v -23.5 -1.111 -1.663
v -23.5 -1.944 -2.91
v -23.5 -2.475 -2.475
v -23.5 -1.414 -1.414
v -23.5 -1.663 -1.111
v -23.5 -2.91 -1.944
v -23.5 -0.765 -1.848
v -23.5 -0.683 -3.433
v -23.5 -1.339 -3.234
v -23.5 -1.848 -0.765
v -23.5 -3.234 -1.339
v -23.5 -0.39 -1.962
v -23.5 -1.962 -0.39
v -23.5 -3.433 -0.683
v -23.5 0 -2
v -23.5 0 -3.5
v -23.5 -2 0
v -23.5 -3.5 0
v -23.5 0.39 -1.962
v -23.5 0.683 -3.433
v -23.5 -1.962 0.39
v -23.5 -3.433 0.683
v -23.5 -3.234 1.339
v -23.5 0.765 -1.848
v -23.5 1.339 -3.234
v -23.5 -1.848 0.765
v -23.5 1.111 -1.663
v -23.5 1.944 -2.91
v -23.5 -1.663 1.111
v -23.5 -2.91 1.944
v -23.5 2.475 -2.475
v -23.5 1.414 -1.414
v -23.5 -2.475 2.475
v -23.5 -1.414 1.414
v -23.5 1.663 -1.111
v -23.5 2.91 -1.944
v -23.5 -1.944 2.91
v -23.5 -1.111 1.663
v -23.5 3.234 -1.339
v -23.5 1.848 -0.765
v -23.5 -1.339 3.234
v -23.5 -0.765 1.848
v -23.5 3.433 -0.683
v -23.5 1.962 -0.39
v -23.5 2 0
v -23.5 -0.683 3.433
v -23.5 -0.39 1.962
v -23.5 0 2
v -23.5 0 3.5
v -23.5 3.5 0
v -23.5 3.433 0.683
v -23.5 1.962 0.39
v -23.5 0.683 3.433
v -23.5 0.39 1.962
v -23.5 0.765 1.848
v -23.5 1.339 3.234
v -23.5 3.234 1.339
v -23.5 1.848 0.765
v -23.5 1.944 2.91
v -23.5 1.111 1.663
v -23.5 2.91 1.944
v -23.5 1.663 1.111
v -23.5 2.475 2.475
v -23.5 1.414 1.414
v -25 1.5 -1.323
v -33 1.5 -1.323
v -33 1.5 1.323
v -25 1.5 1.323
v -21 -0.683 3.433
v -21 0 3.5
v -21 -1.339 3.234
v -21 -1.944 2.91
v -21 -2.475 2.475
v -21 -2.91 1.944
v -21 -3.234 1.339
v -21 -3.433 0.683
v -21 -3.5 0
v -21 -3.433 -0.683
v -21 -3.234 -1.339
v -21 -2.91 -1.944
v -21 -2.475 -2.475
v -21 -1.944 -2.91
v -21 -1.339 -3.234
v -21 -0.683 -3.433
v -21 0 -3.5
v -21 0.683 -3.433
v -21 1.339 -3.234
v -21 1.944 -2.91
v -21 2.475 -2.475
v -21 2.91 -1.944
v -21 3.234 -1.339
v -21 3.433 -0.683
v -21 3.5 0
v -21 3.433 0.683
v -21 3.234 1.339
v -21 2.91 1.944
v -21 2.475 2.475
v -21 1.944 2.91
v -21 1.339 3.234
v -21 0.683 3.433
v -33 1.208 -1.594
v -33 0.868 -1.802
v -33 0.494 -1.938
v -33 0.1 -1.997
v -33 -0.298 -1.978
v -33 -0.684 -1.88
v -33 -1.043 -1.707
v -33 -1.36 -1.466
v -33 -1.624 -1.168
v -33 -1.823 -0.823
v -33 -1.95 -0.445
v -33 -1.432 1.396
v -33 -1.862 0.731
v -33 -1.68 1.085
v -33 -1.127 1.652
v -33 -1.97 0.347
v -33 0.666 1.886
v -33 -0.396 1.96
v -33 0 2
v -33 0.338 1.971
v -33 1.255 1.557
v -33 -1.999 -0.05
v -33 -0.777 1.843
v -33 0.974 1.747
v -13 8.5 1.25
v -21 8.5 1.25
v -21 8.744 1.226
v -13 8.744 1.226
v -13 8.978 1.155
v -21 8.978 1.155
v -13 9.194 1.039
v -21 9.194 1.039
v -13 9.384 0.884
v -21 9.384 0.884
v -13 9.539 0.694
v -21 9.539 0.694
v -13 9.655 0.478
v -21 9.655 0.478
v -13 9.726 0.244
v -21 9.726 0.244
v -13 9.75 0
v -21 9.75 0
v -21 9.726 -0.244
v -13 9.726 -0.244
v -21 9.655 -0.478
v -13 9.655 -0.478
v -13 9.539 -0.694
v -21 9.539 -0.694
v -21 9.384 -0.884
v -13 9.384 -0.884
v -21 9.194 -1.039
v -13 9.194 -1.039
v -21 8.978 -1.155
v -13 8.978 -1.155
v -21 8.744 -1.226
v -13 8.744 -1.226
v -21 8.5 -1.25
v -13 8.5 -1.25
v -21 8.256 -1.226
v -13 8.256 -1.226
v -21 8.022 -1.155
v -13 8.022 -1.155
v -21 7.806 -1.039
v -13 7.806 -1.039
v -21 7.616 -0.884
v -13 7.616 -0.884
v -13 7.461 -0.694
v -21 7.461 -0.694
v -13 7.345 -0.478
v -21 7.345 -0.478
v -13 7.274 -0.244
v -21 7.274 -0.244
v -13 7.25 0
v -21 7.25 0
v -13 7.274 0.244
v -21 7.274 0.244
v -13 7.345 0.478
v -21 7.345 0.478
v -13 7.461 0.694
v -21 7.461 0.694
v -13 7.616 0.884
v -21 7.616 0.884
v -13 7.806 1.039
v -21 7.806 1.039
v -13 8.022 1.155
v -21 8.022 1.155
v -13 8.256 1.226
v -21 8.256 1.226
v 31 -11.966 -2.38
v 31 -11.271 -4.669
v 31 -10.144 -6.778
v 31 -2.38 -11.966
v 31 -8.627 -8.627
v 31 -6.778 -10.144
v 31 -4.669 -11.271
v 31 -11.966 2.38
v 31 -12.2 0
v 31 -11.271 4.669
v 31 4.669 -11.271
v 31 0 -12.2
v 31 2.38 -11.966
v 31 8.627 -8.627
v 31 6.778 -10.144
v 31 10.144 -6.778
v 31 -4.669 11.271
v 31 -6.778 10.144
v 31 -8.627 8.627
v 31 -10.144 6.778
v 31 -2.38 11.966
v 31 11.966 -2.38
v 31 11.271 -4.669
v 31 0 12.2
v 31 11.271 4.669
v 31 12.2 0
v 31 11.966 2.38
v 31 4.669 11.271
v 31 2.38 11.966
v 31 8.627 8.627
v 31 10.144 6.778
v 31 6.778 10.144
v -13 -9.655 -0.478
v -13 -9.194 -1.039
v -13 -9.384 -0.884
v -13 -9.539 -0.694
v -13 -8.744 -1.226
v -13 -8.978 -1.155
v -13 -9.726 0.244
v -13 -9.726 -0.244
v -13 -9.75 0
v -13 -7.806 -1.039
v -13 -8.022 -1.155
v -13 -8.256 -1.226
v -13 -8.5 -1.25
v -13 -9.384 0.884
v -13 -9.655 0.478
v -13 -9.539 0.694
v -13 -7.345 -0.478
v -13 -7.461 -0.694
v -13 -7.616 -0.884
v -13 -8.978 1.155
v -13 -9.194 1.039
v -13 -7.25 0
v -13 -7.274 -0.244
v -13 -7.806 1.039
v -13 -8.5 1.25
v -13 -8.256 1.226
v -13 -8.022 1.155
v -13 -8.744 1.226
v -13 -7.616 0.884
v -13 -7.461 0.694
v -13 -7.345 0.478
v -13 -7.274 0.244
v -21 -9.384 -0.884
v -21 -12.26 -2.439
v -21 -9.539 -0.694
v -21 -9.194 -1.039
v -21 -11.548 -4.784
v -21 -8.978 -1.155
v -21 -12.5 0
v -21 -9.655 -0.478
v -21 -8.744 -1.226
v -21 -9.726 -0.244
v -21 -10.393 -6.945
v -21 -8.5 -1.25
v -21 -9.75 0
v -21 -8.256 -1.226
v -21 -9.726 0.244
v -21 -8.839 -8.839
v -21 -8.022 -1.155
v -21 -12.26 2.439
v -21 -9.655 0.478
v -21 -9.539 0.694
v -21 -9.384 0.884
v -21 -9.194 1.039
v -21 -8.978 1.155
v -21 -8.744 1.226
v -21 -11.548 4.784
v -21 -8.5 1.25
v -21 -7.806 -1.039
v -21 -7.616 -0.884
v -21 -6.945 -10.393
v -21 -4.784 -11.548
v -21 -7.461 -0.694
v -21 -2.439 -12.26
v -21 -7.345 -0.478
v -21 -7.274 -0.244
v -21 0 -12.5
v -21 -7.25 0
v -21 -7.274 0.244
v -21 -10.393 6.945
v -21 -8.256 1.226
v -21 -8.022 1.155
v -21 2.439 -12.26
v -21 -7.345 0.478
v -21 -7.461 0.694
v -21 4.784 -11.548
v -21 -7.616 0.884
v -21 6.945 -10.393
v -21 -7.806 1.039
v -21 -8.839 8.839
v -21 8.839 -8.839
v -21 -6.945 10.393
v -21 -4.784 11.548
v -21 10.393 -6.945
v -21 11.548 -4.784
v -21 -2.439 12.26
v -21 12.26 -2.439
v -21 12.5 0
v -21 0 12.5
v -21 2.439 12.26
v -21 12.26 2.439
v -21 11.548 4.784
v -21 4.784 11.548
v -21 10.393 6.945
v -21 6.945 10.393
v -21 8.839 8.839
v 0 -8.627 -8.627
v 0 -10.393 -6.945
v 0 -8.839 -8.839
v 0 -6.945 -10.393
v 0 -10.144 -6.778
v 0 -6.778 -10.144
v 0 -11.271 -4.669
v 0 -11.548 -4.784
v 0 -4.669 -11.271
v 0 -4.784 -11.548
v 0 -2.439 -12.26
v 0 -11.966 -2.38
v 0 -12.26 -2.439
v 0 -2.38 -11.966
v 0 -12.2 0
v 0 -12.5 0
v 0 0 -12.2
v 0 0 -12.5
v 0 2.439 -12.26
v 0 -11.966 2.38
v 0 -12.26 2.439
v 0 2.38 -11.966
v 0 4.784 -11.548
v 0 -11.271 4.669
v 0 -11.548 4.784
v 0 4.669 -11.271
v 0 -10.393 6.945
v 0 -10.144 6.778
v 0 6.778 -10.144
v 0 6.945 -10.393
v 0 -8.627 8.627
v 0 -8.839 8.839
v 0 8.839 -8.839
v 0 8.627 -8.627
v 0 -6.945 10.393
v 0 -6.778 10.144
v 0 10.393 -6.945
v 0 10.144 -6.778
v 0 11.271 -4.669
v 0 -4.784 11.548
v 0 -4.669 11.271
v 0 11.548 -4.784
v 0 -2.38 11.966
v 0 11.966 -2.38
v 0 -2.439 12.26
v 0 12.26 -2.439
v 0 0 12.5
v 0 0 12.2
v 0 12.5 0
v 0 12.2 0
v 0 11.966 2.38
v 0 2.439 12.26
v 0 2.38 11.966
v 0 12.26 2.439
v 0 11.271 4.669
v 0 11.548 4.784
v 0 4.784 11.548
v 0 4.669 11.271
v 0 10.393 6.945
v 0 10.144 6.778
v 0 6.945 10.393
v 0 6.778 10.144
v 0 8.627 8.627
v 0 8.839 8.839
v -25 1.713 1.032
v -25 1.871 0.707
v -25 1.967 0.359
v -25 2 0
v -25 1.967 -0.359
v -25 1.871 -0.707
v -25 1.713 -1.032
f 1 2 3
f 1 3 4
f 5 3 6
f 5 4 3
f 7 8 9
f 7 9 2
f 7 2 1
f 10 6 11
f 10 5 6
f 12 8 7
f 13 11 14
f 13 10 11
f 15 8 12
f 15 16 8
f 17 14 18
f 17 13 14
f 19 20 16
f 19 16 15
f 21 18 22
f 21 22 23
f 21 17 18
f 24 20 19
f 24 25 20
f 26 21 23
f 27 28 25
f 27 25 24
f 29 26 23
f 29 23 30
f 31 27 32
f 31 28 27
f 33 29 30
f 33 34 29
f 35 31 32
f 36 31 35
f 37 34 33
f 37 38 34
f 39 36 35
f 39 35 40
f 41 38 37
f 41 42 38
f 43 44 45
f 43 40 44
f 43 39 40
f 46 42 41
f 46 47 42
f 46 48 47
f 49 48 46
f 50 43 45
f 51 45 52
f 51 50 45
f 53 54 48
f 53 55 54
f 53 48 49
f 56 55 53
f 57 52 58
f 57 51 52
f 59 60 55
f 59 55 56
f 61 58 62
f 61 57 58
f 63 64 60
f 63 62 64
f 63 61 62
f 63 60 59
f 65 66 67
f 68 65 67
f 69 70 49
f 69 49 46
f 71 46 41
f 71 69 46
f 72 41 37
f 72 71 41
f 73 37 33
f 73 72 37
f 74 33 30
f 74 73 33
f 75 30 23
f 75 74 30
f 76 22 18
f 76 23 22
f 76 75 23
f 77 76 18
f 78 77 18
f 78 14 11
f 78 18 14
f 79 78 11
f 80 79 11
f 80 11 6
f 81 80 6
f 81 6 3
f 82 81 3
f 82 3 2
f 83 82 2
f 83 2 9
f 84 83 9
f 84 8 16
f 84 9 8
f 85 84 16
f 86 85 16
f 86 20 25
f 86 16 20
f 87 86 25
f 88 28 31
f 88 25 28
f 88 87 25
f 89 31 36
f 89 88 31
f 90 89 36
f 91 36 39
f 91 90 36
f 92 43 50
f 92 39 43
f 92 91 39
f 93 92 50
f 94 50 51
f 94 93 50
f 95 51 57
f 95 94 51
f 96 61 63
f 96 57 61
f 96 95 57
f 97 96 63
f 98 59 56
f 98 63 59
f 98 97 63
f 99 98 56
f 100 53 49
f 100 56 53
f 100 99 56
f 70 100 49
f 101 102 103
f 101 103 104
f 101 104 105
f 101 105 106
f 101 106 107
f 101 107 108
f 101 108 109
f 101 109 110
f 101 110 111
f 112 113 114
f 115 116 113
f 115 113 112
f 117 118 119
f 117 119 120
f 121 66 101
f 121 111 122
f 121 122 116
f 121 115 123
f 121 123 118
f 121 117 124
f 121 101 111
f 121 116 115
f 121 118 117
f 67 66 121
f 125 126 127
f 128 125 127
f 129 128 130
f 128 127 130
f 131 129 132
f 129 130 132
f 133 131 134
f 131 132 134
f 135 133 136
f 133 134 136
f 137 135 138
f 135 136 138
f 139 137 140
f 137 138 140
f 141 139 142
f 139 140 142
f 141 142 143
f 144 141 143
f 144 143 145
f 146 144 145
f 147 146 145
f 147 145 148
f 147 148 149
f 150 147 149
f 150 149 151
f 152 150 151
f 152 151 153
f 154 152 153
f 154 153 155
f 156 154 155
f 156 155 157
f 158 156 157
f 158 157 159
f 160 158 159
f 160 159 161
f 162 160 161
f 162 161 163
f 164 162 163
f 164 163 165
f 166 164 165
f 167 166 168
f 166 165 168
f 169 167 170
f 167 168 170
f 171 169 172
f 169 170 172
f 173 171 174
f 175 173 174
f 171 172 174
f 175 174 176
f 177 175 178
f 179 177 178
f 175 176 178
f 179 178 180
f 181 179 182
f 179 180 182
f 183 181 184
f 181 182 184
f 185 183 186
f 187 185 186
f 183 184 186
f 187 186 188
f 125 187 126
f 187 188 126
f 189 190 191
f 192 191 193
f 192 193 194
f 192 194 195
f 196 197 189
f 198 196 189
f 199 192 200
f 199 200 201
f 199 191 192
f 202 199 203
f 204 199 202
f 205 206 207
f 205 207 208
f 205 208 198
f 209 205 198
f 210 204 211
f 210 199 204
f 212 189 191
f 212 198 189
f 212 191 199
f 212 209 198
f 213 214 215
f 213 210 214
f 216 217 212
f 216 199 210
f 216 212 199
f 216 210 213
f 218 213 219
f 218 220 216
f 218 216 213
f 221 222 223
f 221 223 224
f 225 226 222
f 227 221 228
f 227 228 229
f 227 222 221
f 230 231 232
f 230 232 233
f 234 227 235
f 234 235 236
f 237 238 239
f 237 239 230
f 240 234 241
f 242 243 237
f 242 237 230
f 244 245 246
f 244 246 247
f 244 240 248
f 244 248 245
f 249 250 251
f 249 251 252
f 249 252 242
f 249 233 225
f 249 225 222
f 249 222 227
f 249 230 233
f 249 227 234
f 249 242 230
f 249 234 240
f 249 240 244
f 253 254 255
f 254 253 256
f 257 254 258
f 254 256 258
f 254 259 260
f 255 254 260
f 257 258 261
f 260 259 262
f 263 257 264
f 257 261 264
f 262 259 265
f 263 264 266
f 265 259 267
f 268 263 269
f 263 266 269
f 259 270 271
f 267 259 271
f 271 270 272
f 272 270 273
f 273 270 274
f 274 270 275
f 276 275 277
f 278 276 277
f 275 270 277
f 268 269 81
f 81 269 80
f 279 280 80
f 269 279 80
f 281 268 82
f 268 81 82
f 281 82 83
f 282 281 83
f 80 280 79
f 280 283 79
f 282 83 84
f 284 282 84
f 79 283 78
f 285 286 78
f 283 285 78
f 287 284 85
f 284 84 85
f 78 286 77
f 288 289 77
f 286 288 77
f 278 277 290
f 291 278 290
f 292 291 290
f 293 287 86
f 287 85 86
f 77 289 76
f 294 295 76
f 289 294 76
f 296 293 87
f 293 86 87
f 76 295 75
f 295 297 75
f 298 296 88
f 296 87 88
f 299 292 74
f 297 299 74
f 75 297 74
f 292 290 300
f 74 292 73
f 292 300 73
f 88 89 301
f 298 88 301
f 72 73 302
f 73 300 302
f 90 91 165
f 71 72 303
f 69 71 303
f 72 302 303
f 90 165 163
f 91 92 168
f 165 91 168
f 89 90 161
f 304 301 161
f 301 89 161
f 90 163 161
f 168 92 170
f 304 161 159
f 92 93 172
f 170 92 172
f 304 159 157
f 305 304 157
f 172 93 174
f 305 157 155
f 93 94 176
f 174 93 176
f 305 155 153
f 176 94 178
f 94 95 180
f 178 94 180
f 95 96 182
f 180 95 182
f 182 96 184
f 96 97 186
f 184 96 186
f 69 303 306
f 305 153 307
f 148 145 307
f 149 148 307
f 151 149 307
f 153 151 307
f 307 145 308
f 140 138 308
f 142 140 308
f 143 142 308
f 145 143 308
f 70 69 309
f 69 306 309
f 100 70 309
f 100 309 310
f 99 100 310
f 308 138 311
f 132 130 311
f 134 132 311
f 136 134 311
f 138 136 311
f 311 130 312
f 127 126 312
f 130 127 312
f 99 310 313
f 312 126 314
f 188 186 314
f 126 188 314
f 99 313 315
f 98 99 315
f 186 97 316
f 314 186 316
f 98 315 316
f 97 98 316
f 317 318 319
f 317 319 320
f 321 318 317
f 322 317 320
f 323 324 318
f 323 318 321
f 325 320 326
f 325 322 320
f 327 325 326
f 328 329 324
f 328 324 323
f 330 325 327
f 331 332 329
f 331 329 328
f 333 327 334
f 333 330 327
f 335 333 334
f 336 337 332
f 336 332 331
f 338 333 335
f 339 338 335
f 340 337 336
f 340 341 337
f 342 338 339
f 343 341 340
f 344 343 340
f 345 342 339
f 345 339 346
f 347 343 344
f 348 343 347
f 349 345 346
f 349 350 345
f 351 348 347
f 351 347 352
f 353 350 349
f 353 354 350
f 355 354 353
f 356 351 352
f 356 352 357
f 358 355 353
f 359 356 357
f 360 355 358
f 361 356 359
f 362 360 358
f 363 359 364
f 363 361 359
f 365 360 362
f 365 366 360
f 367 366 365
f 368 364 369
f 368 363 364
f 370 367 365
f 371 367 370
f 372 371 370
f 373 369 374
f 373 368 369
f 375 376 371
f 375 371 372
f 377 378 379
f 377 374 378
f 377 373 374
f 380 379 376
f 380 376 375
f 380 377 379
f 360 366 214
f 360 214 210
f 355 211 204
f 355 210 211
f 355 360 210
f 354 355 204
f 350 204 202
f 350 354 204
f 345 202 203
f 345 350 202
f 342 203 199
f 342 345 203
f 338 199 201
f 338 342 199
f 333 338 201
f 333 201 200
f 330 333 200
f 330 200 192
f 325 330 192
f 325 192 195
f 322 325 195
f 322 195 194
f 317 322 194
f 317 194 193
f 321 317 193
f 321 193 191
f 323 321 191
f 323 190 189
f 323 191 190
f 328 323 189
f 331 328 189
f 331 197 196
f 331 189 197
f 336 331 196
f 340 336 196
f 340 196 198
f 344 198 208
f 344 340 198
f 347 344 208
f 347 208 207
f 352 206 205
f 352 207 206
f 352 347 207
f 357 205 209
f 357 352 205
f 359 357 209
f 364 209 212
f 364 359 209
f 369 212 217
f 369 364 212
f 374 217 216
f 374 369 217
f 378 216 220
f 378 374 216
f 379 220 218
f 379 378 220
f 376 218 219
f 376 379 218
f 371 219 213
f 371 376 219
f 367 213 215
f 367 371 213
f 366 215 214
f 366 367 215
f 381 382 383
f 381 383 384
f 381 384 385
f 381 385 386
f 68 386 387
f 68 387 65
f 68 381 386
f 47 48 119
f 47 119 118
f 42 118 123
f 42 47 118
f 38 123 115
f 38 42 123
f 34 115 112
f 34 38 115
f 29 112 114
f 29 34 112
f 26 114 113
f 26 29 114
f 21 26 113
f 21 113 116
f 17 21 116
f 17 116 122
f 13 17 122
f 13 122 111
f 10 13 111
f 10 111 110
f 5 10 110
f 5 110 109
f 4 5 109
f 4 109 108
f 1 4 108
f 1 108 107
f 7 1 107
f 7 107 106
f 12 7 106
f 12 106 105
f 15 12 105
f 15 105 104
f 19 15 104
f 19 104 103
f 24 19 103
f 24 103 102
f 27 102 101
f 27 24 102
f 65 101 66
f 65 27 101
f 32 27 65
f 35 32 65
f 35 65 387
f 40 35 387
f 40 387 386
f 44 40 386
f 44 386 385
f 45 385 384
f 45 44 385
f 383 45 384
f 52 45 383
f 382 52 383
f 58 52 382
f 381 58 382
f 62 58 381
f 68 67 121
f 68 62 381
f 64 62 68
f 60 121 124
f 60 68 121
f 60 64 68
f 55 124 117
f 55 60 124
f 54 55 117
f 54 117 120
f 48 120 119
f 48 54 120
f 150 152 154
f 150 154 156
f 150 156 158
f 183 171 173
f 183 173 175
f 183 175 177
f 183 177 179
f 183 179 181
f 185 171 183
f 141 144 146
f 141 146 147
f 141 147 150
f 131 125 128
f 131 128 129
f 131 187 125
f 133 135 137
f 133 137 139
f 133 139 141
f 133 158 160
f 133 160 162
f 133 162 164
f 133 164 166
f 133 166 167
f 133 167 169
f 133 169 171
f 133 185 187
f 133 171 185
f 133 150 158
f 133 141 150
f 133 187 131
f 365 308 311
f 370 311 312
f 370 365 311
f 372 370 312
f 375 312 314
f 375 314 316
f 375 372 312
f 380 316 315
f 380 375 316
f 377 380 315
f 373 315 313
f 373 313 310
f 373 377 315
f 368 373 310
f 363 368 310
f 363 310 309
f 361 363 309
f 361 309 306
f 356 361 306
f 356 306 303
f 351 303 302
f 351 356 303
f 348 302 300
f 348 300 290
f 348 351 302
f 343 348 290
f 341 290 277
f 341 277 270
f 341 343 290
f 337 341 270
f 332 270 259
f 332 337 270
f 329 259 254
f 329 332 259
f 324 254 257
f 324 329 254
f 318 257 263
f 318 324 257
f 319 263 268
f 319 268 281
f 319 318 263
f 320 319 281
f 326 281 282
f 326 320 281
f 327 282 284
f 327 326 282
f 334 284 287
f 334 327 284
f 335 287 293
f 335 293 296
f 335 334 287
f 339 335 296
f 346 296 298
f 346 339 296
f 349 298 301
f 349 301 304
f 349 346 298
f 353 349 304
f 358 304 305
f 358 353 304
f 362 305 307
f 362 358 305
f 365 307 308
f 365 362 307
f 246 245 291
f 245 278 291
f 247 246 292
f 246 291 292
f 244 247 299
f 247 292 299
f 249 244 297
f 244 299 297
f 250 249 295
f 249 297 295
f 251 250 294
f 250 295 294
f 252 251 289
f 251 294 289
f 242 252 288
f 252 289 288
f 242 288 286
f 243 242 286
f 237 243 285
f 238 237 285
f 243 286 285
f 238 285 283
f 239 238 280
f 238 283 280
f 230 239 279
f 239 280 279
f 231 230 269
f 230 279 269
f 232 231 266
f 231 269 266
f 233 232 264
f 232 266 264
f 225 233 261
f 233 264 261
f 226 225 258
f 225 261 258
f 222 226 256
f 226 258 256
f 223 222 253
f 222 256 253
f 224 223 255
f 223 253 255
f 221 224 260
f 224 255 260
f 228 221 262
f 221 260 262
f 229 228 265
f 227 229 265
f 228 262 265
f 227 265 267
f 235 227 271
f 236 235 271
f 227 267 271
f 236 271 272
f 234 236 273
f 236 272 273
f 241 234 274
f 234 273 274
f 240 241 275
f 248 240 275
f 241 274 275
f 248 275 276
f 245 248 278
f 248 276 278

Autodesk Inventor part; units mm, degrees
ref_plane "YZ Plane" through (0, 0, 0) normal (1, 0, 0) x (0, 1, 0)
ref_plane "XZ Plane" through (0, 0, 0) normal (0, 1, 0) x (-1, 0, 0)
ref_plane "XY Plane" through (0, 0, 0) normal (0, 0, 1) x (1, 0, 0)
sketch "Sketch1" plane through (0, 0, 0) normal (1, 0, 0) x (0, 1, 0)
  circle A0 centre (0, 0) radius 12.2
  circle A1 centre (0, 0) radius 12.5
  dimension "d0" = 24.4
  dimension "d1" = 25
extrude "Extrusion1" add sketch "Sketch1" along normal blind 31 contours A0
extrude "Extrusion2" add sketch "Sketch1" against normal blind 21 contours A0 | A1
sketch "Sketch2" plane through (-21, 0, 0) normal (-1, 0, 0) x (0, 0, 1)
  circle A0 centre (0, 0) radius 3.5
  dimension "d6" = 7
extrude "Extrusion3" add sketch "Sketch2" along normal blind 2.5
sketch "Sketch3" plane through (-23.5, 0, 0) normal (-1, 0, 0) x (0, 0, 1)
  circle A0 centre (0, 0) radius 2
  dimension "d9" = 4
extrude "Extrusion4" add sketch "Sketch3" along normal blind 9.5
sketch "Sketch4" plane through (-33, 0, 0) normal (-1, 0, 0) x (0, 0, 1)
  circle A0 centre (0, 0) radius 2
  circle A1 centre (0, 0) radius 2 projected
  line L0 (-1.3229, 1.5) -> (1.3229, 1.5)
  circle A2 centre (0, 0) radius 2 projected
  dimension "d12" = 4
  dimension "d13" = 3.5
extrude "Extrusion5" cut sketch "Sketch4" against normal blind 8 contours L0 A0 picked at (-0.3089, 1.5908)
sketch "Sketch5" plane through (-21, 0, 0) normal (-1, 0, 0) x (0, 0, 1)
  arc A0 (-1.3229, 1.5) -> (1.3229, 1.5) centre (0, 0) ccw projected
  line L0 (0, 0) -> (0, 8.5) construction
  circle A1 centre (0, 8.5) radius 1.25
  line L1 (0, 0) -> (0, -8.5) construction
  circle A2 centre (0, -8.5) radius 1.25
  dimension "d16" = 8.5
  dimension "d17" = 2.5
  dimension "d18" = 8.5
  dimension "d19" = 2.5
extrude "Extrusion6" cut sketch "Sketch5" against normal blind 8
thread "Thread1" size "M3x0.5" class "6H" standard "ANSI Metric M Profile" full length
thread "Thread2" size "M3x0.5" class "6H" standard "ANSI Metric M Profile" full length
properties part number "motor6kg"
